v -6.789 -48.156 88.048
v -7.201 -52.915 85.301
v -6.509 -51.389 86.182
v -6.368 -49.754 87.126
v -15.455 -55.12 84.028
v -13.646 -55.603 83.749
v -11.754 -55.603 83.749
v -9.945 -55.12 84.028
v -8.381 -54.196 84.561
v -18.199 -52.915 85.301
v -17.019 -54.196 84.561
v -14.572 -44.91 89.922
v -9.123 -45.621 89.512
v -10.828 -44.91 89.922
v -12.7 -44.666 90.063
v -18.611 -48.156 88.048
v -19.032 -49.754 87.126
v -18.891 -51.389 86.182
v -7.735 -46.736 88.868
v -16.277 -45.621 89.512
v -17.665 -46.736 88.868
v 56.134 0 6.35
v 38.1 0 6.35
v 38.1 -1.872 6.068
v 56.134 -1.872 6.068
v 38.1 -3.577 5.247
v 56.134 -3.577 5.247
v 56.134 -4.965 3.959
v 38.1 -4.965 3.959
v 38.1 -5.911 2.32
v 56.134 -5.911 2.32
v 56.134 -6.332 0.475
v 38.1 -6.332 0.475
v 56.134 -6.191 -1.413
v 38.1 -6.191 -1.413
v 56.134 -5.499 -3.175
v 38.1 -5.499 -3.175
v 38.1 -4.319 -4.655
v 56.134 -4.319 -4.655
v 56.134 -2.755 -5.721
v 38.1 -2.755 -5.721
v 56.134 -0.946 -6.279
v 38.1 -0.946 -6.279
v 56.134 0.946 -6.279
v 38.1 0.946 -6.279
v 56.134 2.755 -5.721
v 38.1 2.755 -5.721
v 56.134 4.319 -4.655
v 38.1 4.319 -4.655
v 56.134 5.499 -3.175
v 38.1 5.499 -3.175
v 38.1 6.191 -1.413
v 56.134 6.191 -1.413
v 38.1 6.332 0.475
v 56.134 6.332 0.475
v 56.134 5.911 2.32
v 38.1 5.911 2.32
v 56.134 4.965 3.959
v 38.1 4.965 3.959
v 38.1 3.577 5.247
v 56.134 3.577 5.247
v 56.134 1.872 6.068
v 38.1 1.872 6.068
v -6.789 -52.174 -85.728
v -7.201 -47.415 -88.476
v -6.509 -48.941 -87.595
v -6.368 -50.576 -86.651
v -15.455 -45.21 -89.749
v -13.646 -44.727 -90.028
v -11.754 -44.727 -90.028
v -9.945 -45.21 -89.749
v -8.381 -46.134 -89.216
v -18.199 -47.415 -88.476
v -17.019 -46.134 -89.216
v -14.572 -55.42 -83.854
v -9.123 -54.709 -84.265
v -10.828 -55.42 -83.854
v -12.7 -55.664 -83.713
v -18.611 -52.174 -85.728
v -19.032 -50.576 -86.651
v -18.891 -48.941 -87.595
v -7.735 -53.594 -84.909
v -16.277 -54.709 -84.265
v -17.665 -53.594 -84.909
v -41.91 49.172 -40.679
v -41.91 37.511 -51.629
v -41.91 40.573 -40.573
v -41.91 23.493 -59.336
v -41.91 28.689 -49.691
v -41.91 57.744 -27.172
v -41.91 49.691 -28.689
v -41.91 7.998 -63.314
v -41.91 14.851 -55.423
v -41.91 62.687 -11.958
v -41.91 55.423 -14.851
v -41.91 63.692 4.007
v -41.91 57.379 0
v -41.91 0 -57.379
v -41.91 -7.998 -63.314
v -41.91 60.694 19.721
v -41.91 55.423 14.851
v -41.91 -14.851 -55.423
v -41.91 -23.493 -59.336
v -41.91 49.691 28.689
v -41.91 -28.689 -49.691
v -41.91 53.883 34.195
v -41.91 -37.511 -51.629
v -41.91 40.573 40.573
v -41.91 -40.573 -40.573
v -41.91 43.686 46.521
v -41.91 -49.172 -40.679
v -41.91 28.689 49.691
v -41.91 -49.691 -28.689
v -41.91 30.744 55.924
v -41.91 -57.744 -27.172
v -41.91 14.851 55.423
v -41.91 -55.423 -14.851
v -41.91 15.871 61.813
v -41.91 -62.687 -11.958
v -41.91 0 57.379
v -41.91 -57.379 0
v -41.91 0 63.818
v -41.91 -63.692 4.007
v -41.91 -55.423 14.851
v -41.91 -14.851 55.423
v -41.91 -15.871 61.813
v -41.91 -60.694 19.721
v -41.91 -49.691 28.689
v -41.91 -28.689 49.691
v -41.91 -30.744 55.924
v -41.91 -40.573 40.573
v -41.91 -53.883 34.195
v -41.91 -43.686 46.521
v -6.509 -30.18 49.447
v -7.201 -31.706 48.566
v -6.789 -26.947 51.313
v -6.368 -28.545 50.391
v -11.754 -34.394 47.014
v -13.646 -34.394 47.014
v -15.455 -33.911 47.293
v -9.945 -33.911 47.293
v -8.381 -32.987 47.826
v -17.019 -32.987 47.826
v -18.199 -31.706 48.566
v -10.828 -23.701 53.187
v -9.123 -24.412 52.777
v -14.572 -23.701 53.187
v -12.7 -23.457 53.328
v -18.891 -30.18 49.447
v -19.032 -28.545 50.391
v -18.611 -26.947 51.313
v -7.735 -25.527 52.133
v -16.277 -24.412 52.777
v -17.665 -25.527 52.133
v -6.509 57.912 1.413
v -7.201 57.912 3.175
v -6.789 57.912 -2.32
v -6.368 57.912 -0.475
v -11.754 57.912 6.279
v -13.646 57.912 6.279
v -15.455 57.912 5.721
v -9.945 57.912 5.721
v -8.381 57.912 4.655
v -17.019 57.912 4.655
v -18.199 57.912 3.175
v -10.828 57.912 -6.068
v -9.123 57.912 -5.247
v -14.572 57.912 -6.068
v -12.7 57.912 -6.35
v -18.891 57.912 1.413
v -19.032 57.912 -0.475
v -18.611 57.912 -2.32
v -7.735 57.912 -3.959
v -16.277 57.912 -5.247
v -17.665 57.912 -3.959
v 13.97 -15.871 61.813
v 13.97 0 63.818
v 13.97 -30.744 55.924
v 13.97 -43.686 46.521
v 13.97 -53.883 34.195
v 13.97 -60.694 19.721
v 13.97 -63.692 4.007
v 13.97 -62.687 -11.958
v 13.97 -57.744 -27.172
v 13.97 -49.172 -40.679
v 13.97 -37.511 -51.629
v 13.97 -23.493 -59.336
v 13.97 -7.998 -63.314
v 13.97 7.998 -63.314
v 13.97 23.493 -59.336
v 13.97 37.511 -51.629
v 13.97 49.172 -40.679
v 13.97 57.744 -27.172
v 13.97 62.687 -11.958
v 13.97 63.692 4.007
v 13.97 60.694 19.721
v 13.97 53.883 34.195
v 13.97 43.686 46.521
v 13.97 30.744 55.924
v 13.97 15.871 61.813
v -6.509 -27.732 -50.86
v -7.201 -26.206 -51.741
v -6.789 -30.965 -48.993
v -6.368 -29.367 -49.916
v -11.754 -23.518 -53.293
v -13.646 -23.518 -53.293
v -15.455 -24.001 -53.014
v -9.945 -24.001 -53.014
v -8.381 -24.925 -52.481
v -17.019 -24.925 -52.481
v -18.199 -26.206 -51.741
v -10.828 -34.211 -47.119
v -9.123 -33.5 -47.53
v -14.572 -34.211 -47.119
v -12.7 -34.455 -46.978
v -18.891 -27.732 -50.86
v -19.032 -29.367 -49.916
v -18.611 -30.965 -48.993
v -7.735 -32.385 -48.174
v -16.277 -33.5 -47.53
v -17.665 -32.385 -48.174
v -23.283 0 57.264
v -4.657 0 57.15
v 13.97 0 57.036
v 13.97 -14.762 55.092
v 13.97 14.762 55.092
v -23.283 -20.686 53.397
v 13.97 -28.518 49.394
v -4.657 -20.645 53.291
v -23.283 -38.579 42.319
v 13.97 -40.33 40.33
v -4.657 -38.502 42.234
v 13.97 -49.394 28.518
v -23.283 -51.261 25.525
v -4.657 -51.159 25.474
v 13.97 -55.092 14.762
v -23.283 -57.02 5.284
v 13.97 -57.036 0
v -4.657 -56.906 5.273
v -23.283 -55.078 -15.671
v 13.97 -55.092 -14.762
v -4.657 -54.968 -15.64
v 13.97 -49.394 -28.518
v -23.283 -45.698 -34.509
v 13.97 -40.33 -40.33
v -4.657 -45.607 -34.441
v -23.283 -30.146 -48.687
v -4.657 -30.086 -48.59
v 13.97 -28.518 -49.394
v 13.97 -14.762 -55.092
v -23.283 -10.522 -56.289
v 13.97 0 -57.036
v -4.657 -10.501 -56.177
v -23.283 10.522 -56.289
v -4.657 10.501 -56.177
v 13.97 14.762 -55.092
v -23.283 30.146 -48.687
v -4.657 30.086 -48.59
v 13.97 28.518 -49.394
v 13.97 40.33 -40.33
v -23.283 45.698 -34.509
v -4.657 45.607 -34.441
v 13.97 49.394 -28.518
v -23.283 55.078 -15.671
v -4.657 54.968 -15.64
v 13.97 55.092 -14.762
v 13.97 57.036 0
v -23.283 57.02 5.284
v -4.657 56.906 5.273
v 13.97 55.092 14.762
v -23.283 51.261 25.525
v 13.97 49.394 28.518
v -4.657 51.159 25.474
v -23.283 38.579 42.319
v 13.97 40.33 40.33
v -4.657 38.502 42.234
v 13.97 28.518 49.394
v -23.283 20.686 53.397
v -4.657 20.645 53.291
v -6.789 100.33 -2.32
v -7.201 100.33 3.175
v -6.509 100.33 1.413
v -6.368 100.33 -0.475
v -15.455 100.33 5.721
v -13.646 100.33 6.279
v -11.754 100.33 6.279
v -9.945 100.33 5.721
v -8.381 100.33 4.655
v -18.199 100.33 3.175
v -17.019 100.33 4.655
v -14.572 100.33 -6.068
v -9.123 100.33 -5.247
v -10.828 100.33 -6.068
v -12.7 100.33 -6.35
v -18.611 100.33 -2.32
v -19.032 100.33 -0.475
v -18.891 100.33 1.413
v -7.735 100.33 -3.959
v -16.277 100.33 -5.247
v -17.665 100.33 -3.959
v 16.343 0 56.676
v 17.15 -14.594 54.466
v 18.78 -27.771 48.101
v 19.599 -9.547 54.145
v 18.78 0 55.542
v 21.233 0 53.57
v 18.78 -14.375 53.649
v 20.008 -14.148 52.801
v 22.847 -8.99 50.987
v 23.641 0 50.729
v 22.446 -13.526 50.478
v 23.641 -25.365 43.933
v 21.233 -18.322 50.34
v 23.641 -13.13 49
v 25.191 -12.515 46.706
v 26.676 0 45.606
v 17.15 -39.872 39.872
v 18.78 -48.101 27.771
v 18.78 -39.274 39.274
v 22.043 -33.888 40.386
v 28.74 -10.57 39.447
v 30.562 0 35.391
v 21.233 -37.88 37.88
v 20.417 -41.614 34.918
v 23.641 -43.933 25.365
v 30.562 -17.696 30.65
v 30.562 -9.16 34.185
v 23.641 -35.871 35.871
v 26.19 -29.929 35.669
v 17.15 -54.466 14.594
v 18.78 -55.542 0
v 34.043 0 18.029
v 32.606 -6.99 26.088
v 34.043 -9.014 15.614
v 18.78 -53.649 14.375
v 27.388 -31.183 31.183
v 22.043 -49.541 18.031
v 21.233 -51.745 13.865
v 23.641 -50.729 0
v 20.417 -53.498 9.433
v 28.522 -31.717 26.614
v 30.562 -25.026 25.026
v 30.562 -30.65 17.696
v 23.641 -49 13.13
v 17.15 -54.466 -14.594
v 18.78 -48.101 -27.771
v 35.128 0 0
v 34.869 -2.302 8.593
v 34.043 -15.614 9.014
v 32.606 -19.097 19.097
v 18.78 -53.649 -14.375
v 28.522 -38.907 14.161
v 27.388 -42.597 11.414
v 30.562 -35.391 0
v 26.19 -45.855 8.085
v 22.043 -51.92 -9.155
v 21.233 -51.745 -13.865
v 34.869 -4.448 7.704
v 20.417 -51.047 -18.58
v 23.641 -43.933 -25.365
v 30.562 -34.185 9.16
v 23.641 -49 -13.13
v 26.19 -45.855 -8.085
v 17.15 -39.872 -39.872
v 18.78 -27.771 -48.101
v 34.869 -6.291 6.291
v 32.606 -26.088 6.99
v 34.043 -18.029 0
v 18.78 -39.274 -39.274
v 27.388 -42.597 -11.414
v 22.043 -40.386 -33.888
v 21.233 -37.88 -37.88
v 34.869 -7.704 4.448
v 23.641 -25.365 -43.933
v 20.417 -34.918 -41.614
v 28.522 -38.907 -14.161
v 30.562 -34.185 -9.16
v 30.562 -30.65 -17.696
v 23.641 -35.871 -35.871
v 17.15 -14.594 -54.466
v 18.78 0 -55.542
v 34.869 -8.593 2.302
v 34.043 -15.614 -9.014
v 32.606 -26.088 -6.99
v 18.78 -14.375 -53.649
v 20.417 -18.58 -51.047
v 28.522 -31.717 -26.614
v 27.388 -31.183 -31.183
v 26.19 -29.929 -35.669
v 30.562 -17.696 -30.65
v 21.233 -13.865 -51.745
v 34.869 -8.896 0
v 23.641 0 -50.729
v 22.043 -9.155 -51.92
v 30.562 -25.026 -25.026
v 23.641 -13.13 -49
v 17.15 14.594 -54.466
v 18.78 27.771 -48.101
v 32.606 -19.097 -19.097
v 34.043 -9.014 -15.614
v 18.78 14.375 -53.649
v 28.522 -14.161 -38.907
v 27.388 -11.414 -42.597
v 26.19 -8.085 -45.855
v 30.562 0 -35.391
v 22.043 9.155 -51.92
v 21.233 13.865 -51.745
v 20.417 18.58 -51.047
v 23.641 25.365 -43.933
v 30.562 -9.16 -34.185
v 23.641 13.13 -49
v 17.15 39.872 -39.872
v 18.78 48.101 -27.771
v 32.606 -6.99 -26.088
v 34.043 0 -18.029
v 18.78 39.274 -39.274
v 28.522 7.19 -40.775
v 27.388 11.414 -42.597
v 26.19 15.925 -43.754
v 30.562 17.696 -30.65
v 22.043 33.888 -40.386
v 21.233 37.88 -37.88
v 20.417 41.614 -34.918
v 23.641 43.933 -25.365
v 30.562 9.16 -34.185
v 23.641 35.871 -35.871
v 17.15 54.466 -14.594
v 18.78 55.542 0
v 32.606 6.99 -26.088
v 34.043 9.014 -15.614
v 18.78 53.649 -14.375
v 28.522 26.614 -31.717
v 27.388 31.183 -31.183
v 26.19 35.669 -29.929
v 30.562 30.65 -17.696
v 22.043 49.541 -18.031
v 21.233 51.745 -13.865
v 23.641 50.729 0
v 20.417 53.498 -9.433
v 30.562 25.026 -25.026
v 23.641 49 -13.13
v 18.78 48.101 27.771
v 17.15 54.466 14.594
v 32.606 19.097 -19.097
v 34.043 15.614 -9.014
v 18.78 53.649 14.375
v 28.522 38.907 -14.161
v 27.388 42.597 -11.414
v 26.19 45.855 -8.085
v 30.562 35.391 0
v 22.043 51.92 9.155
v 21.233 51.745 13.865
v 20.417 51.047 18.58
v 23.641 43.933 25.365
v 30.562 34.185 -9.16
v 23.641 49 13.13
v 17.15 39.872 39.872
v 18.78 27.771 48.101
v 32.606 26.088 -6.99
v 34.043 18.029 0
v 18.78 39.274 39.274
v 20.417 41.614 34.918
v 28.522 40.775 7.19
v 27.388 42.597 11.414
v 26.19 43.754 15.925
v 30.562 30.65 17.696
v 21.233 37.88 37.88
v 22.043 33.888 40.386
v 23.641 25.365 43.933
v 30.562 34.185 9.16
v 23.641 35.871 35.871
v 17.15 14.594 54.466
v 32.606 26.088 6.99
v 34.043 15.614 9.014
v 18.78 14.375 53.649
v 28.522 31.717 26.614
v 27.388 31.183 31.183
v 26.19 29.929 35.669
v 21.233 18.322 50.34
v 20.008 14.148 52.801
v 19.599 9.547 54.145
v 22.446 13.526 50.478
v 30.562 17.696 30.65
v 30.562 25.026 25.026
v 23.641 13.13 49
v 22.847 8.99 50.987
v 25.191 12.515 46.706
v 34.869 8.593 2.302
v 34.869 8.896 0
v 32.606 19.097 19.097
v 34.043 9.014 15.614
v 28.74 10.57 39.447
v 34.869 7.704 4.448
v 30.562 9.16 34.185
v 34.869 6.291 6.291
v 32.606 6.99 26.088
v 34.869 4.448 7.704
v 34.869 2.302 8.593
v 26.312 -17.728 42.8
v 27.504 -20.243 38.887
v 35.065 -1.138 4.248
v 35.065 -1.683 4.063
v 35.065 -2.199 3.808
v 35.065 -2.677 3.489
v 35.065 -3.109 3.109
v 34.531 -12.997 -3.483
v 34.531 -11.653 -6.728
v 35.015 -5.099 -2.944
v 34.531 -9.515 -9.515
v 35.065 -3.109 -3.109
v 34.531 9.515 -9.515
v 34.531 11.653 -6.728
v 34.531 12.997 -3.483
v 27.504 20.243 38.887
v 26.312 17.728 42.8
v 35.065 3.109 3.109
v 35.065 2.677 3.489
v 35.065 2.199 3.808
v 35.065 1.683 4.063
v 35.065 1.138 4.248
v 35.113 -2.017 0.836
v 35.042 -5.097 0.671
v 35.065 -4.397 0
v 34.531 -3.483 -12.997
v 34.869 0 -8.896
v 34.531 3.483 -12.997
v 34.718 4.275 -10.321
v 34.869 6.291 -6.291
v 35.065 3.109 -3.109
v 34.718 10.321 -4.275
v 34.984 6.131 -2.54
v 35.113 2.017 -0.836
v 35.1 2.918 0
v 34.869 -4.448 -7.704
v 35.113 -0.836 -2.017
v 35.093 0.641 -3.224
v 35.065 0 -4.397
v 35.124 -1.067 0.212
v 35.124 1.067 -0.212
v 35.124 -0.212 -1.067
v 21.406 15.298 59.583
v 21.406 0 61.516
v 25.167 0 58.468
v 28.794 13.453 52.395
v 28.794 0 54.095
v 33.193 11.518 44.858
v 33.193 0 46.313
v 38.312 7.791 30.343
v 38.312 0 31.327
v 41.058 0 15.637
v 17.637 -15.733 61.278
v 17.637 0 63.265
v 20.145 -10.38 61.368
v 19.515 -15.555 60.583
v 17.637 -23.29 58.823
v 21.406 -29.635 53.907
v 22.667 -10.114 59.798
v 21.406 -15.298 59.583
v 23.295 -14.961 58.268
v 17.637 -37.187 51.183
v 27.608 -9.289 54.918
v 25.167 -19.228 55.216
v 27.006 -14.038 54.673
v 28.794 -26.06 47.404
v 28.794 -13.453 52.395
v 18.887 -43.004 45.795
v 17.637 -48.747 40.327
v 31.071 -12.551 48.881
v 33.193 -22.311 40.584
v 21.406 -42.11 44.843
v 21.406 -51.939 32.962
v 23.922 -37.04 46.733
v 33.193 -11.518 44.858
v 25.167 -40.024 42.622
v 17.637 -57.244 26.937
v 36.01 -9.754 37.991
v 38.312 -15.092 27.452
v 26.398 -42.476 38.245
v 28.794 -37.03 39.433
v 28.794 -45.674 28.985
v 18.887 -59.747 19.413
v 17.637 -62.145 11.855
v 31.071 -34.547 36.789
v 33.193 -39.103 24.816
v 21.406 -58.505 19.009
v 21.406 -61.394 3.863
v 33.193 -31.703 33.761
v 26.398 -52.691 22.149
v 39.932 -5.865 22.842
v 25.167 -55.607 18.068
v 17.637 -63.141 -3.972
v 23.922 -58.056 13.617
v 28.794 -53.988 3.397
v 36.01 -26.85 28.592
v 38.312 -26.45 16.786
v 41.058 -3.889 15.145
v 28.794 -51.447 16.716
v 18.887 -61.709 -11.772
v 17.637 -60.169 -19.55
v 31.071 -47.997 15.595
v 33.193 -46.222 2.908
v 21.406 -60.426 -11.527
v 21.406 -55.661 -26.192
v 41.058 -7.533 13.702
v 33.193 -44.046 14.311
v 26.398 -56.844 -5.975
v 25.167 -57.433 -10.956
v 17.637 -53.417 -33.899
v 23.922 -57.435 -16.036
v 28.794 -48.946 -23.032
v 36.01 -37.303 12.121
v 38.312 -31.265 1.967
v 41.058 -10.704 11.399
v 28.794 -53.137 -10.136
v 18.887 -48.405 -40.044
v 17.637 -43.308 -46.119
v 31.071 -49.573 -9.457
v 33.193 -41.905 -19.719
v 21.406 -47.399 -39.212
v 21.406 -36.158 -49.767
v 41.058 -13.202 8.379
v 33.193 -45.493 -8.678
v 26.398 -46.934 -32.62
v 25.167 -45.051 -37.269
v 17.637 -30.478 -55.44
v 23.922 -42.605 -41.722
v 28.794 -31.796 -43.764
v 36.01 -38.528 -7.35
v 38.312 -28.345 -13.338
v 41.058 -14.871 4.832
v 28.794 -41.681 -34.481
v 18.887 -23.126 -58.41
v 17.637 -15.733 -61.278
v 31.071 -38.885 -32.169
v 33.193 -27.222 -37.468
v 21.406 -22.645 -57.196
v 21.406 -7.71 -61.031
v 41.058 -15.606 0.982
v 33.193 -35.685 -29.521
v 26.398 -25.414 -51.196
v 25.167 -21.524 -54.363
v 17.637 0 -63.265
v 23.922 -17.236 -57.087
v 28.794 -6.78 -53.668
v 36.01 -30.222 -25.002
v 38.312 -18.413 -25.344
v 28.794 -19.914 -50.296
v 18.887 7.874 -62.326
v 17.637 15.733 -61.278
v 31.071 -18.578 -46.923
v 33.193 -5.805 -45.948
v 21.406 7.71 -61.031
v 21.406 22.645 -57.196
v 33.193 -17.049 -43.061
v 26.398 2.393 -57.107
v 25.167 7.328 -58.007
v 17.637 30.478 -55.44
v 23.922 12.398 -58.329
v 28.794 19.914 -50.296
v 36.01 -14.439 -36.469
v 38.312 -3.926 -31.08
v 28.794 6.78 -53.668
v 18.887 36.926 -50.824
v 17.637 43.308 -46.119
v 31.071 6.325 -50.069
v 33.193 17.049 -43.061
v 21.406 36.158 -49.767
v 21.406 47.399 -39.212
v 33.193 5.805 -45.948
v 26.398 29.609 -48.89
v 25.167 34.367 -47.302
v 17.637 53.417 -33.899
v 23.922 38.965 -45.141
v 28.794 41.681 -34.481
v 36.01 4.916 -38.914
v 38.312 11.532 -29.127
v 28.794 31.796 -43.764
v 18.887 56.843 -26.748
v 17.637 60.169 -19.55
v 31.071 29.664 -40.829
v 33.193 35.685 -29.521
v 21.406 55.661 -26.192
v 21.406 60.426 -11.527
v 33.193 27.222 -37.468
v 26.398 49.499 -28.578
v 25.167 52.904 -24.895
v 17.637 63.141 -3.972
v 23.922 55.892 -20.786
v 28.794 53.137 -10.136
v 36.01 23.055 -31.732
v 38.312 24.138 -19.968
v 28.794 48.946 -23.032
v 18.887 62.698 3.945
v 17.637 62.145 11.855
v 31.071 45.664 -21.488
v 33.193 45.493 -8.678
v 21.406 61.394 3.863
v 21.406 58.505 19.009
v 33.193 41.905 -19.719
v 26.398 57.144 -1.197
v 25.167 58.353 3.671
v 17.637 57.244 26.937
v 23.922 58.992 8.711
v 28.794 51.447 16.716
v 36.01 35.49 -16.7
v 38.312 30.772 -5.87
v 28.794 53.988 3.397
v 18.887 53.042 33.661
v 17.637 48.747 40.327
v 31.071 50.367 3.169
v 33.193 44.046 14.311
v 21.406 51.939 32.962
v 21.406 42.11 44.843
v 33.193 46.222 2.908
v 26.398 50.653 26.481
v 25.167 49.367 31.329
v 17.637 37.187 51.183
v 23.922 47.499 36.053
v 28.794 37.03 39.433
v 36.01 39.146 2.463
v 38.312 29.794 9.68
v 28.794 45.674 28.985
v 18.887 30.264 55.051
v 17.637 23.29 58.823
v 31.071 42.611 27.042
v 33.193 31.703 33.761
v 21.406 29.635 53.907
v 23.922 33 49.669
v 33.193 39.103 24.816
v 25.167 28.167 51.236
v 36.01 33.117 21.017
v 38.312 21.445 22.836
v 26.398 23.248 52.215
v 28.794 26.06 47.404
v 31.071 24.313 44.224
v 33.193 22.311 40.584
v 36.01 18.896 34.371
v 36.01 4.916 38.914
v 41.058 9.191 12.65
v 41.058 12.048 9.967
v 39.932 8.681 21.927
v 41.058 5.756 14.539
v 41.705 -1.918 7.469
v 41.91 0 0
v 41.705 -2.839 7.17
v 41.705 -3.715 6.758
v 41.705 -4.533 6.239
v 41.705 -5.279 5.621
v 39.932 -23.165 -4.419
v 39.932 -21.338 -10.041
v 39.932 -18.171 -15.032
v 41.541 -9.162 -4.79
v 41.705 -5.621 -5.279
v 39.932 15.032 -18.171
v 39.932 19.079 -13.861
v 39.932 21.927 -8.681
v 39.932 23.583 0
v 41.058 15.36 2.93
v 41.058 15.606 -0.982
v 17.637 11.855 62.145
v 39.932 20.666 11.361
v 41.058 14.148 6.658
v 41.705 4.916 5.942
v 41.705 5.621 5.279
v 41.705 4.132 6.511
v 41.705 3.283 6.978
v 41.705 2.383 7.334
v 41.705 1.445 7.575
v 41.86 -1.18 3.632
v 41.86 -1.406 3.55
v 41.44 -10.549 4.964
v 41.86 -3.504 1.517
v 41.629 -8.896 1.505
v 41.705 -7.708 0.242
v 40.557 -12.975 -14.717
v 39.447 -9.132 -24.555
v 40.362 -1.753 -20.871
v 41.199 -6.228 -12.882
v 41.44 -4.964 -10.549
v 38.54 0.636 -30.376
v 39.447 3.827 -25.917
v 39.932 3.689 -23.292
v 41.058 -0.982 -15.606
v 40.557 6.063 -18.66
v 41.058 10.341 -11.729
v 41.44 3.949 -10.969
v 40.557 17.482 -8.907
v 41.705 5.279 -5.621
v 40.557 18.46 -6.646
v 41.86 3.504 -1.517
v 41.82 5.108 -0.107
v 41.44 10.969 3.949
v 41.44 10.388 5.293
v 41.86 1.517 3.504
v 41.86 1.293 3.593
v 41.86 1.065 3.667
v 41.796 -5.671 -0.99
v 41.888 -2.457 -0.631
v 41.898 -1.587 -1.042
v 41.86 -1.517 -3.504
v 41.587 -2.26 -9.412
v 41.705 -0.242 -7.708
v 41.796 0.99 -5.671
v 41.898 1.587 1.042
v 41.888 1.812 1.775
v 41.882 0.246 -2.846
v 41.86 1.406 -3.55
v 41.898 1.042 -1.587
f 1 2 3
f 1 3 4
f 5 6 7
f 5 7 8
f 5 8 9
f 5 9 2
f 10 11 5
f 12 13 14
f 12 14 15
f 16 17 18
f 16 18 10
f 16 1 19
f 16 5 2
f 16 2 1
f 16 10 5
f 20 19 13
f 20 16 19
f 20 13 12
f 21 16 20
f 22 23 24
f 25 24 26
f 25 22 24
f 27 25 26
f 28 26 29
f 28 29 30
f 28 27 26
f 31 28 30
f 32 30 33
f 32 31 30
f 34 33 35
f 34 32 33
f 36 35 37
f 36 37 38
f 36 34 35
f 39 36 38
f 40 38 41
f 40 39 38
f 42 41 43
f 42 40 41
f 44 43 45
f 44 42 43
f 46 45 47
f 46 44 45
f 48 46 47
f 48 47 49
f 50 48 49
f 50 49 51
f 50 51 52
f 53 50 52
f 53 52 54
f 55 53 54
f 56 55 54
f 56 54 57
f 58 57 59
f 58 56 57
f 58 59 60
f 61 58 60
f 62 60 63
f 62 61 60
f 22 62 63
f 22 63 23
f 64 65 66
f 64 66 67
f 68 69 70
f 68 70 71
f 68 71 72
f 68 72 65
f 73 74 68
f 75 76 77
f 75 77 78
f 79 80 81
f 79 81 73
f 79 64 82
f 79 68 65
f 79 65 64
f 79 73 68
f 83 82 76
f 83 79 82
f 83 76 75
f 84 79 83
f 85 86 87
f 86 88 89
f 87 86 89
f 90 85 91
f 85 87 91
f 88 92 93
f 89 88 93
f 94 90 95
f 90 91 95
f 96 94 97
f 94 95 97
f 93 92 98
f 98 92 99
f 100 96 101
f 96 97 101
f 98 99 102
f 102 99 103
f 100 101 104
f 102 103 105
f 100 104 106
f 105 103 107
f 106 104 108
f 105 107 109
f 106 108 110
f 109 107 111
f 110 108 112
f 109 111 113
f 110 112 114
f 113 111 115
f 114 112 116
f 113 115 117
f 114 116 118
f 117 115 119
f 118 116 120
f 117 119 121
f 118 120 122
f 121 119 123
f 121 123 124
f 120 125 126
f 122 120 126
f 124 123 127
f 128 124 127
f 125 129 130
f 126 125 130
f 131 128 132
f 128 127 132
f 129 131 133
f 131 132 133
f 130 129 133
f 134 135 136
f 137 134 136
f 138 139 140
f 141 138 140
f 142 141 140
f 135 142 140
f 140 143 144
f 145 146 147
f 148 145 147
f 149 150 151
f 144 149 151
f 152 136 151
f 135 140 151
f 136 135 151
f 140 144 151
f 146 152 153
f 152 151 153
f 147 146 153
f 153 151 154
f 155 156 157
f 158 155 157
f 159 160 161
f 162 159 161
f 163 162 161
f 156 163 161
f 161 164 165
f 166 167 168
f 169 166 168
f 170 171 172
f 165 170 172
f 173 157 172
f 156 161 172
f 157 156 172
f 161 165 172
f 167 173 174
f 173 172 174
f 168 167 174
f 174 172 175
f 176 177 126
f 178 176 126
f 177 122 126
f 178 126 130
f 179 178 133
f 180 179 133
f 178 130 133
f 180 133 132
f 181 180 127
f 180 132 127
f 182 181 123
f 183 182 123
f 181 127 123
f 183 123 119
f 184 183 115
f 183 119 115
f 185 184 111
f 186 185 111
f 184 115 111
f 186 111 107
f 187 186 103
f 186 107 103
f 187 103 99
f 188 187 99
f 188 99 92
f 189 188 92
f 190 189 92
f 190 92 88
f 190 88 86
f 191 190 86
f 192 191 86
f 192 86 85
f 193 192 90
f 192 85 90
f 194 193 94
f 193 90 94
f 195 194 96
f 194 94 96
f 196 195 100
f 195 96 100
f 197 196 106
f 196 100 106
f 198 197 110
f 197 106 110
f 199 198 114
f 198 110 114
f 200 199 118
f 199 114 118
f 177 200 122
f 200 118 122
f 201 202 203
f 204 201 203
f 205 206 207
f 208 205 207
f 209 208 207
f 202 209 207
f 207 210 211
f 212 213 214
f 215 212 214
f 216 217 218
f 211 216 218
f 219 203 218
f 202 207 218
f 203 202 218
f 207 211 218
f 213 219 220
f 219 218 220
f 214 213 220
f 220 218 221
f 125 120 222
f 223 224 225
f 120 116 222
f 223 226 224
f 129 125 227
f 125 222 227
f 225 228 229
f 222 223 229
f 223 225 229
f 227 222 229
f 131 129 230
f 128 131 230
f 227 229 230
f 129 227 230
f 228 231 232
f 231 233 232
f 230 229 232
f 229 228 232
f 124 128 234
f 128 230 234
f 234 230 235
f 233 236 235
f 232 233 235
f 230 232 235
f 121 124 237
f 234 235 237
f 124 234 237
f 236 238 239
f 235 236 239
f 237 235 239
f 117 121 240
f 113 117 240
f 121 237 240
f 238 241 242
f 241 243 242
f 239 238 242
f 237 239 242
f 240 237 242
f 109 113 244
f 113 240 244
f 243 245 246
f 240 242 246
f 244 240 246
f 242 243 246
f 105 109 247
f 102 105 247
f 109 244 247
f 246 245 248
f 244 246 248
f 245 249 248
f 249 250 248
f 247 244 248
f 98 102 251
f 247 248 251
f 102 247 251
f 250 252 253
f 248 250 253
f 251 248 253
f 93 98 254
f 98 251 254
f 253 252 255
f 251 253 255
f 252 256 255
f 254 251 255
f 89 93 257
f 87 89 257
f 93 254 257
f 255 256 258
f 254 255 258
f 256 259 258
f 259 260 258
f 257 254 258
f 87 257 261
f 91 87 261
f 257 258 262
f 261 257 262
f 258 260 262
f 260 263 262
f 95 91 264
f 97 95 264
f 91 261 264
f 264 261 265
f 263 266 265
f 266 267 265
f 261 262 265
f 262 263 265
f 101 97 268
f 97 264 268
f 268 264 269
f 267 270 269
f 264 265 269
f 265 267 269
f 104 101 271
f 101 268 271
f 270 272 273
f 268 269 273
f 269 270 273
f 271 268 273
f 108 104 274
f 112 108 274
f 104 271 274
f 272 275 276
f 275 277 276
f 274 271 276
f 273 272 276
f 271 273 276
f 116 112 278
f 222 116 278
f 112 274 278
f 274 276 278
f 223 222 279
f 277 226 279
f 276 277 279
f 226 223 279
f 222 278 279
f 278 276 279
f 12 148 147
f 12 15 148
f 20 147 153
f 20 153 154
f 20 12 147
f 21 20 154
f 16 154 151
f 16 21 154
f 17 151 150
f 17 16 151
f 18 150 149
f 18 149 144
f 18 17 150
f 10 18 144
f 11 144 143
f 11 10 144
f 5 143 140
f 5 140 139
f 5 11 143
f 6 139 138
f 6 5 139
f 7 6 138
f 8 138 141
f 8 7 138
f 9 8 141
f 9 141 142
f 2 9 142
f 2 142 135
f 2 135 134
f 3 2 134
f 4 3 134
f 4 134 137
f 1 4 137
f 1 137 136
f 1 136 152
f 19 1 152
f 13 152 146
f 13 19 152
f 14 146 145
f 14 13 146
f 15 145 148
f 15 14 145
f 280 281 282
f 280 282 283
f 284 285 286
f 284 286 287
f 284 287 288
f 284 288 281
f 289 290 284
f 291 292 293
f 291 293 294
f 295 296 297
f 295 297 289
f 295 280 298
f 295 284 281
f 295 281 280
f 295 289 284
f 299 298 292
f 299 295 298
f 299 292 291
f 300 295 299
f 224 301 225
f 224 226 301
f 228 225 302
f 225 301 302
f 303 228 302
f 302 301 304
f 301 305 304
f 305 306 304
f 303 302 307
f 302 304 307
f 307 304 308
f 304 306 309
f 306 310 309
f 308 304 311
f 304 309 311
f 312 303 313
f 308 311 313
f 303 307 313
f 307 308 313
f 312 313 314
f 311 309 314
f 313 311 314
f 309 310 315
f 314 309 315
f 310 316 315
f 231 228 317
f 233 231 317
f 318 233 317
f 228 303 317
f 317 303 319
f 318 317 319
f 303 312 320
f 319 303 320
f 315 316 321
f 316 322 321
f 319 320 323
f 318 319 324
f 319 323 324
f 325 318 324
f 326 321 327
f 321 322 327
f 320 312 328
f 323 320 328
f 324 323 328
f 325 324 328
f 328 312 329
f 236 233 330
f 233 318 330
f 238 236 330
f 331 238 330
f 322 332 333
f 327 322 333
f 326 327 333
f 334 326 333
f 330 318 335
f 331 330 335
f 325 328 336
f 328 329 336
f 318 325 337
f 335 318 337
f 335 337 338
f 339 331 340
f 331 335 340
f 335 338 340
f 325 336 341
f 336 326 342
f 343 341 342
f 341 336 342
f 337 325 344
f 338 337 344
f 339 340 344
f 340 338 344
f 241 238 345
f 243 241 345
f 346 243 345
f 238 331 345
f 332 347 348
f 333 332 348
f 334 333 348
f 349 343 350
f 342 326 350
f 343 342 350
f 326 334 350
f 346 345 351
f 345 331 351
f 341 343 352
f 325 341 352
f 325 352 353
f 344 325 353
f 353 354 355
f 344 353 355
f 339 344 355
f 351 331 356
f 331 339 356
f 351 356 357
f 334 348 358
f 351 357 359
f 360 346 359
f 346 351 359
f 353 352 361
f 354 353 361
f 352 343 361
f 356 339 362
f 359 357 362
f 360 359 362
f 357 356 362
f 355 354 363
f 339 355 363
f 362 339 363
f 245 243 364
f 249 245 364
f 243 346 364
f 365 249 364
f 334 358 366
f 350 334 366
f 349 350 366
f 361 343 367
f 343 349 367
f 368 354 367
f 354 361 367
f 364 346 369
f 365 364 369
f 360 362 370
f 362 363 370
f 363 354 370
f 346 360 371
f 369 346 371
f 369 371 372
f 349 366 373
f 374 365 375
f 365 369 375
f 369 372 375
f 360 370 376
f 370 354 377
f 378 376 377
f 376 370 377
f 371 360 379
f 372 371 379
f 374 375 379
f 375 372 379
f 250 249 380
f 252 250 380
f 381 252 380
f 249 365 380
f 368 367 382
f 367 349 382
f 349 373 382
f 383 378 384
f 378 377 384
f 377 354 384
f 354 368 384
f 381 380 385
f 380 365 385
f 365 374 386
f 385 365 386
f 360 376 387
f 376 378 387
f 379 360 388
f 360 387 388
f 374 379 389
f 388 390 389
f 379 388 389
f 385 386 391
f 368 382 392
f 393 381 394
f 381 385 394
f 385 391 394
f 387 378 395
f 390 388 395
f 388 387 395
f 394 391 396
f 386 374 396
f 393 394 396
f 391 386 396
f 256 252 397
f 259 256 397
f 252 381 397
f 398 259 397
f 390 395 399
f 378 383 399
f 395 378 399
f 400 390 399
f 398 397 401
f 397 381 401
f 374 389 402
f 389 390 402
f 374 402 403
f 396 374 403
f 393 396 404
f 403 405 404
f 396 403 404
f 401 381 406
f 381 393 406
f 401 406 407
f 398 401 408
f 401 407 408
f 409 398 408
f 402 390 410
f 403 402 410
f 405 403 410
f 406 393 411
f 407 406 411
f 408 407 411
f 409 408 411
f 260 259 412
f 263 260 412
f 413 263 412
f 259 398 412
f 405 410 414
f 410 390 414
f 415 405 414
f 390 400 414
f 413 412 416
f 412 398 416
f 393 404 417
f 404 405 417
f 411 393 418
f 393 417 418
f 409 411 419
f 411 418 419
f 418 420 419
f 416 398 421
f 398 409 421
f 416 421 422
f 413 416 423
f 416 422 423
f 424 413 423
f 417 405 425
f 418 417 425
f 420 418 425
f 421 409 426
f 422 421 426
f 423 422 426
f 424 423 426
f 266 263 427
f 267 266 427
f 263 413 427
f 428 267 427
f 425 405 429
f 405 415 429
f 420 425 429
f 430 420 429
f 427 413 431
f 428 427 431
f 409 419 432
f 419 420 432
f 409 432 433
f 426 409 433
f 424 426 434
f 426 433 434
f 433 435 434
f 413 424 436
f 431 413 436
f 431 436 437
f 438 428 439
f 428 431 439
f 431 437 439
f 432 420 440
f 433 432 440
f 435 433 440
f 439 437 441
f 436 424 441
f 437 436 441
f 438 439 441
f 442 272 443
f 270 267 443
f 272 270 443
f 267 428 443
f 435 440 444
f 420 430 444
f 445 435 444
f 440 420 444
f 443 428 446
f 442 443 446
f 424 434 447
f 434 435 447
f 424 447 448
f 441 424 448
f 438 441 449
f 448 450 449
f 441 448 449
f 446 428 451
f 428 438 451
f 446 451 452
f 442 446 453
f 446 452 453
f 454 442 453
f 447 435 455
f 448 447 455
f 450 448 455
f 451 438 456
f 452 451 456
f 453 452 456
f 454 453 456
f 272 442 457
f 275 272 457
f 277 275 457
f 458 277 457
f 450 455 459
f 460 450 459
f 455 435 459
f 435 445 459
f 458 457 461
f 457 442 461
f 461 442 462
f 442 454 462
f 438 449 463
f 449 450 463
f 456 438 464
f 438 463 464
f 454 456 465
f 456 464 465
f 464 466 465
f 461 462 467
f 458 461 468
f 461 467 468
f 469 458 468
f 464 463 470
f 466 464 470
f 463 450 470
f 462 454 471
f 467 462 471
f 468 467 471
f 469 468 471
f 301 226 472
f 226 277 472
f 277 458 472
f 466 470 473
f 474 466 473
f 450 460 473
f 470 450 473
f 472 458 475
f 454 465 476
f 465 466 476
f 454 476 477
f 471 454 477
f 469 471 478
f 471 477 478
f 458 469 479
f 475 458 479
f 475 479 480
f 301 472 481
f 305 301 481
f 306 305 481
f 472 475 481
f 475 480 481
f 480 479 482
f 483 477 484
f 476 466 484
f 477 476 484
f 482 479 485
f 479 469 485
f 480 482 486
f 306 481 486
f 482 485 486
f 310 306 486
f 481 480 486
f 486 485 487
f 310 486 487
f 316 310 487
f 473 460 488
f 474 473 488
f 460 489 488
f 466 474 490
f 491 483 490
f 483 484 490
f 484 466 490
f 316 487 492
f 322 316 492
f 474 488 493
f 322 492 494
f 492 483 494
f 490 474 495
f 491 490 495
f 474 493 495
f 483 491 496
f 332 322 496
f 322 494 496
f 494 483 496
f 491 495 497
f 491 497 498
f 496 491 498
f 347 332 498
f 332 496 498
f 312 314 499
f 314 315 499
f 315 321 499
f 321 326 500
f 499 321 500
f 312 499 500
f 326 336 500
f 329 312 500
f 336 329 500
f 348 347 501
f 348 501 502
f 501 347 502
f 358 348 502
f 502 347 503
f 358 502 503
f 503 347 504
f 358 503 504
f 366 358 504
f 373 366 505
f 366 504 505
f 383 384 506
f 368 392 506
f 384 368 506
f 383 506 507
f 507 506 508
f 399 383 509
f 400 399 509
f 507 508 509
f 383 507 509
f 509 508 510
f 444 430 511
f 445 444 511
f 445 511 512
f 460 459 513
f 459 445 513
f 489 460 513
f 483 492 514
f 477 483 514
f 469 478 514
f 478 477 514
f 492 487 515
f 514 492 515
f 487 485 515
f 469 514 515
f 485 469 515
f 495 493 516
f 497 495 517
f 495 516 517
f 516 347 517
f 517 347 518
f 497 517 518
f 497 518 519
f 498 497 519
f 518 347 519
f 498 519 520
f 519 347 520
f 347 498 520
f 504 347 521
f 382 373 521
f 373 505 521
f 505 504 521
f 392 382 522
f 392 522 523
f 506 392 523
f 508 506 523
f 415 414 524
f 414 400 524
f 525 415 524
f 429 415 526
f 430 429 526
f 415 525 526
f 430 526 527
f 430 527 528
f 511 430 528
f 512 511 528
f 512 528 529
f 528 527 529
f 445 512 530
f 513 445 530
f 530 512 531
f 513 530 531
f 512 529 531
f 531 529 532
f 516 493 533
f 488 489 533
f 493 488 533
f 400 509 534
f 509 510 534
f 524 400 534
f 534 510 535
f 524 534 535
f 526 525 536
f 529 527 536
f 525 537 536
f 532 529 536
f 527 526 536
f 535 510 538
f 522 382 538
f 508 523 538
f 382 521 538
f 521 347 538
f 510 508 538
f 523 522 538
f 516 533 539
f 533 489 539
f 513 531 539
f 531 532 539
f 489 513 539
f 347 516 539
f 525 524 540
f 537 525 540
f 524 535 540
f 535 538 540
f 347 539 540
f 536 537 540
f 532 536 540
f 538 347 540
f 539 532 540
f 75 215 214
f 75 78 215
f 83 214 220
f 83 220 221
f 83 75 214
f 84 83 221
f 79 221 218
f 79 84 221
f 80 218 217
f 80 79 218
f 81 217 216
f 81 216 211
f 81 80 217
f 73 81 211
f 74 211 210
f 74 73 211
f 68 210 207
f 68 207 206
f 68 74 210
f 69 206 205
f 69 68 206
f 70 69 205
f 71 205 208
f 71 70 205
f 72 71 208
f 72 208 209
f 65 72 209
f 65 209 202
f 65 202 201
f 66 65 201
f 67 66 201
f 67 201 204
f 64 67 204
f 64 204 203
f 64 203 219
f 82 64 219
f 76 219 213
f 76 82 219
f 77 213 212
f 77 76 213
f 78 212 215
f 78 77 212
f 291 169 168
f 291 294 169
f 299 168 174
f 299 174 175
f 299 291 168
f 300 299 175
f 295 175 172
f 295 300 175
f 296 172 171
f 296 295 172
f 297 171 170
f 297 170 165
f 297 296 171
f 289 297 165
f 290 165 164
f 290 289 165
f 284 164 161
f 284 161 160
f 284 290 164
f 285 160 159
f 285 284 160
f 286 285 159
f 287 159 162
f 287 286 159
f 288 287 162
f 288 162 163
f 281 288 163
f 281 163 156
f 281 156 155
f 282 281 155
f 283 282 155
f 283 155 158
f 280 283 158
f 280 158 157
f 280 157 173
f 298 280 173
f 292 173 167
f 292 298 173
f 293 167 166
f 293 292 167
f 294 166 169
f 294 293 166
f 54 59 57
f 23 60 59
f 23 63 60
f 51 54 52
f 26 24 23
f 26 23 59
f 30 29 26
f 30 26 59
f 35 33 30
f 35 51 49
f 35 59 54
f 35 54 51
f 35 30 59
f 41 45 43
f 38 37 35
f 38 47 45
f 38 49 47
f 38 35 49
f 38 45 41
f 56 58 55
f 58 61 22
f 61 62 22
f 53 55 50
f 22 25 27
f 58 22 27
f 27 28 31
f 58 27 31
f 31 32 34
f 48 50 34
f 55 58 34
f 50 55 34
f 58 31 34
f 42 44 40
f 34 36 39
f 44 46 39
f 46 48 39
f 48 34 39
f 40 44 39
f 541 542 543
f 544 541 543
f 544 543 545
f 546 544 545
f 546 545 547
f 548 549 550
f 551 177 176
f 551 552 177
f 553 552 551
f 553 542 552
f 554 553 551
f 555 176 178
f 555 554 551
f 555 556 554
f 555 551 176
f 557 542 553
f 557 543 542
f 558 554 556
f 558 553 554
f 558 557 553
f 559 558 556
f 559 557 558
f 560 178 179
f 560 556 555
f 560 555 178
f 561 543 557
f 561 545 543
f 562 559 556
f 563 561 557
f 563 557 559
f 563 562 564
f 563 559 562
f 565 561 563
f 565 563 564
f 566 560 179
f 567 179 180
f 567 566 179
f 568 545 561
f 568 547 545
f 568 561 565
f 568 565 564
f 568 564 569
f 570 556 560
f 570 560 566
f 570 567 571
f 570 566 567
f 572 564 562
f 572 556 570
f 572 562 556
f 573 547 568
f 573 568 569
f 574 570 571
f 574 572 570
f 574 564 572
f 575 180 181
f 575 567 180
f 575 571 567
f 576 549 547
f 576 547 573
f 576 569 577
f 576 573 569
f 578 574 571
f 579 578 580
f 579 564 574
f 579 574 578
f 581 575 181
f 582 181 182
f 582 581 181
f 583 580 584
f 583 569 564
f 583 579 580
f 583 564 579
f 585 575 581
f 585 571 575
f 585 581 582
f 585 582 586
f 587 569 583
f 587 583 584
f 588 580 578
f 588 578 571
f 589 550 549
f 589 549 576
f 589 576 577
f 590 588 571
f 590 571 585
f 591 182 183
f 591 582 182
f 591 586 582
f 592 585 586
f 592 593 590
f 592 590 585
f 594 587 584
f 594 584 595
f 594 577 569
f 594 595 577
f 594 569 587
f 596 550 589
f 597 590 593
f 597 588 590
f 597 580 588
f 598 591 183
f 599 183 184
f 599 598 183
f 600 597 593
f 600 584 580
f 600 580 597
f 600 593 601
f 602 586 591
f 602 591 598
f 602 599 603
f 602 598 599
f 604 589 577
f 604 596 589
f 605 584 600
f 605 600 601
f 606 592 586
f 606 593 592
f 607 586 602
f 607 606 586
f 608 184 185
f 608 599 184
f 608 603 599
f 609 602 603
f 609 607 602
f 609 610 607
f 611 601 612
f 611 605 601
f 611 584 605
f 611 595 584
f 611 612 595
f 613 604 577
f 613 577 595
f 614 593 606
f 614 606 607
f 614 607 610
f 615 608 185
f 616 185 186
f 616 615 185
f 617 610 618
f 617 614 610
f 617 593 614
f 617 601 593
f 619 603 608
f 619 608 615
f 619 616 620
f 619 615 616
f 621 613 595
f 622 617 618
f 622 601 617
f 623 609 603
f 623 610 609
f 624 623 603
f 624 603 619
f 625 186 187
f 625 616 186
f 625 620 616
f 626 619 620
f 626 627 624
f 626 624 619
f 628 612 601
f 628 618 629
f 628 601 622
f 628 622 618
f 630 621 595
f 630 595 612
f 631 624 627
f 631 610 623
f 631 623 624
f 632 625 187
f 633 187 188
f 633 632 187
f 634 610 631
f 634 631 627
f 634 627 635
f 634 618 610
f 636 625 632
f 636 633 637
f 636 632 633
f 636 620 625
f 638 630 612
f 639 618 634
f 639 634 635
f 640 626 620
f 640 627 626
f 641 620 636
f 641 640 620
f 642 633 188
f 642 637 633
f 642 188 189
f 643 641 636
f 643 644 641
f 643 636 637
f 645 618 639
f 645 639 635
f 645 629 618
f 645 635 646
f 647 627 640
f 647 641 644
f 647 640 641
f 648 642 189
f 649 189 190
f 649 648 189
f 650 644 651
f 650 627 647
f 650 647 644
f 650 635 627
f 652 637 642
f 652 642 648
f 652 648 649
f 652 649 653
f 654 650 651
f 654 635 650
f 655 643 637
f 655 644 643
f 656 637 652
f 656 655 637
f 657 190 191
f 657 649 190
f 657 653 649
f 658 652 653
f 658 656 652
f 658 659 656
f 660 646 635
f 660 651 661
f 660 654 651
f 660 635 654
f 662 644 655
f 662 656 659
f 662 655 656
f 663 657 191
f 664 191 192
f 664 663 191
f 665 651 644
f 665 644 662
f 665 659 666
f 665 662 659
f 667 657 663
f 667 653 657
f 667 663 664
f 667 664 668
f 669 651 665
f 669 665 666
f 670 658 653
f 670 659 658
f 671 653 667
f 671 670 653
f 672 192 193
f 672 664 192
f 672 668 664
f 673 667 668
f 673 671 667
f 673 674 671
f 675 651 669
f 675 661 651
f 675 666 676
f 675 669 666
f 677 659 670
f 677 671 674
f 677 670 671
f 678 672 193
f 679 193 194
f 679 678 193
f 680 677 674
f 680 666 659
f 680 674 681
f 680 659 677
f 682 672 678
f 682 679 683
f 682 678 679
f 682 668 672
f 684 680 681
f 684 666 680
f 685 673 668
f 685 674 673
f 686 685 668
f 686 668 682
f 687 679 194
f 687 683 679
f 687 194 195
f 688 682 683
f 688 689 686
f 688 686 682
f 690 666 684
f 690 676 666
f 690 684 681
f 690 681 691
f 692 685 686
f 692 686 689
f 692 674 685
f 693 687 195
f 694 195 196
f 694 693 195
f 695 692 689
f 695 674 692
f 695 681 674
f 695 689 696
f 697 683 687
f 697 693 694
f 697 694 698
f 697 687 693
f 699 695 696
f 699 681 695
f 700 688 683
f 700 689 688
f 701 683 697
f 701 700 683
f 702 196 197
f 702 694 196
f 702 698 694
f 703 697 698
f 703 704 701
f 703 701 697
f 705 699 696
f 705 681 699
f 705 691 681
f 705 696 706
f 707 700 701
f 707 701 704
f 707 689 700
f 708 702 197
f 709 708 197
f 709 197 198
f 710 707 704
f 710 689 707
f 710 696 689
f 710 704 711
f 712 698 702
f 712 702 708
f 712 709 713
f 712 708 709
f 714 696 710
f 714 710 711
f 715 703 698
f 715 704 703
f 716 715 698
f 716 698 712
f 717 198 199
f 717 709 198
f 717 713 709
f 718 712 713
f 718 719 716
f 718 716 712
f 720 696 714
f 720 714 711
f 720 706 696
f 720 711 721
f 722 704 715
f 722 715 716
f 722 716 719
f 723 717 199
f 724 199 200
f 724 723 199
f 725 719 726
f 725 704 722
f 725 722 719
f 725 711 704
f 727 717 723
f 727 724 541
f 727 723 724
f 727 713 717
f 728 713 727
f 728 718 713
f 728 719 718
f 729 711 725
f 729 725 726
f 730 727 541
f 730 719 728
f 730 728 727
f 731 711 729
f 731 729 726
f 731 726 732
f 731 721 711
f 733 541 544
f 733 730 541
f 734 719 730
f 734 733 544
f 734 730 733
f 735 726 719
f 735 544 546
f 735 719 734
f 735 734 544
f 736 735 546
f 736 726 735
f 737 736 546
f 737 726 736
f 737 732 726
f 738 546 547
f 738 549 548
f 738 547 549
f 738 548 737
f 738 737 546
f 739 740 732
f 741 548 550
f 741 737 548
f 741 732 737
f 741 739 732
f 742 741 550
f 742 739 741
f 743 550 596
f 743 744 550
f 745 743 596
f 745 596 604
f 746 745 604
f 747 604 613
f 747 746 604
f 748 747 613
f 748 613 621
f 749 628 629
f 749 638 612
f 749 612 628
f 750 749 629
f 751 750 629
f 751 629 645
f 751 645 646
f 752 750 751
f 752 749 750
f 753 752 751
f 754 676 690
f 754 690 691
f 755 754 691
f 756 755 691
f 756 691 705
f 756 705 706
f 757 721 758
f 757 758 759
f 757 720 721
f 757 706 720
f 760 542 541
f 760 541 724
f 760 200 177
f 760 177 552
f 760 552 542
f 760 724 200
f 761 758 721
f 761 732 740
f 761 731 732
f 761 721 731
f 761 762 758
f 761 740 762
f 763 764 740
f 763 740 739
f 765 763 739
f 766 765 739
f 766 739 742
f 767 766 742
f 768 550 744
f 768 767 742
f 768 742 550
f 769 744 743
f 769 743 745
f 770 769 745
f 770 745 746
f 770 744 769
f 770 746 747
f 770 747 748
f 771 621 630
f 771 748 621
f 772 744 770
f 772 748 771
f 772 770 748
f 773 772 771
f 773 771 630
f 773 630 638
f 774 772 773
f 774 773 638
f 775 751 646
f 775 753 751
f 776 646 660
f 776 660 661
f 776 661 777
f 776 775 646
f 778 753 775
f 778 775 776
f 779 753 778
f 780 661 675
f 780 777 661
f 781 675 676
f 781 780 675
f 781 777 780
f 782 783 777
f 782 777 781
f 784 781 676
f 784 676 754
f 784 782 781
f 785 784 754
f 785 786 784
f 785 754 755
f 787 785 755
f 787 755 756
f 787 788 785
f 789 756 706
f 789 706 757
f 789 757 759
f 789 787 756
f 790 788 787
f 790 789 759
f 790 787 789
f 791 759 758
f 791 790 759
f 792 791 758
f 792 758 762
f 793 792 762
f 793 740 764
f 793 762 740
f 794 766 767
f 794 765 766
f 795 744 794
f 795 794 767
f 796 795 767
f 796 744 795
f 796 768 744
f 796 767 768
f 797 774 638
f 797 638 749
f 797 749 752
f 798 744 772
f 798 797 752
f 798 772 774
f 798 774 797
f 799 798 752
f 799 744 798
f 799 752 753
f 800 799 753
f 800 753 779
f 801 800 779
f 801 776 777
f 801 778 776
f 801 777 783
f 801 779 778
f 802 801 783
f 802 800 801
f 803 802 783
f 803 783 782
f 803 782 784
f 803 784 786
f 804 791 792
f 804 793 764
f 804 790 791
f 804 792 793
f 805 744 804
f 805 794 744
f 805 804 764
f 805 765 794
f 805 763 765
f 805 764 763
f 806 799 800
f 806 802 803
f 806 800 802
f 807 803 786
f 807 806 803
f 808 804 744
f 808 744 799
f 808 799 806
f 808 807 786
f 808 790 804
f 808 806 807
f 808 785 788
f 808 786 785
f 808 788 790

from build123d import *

# Parameters (mm, degrees)
SKETCH2_W         = 6.35
SKETCH2_H         = 42.418
CIRPATTERN1_COUNT = 3
SKETCH3_W         = 18.034
SKETCH3_H         = 6.35


with BuildPart() as part:
    # Sketch1 → Revolve1 (revolve)
    with BuildSketch(Plane.XY):
        with BuildLine():
            Line((35.1282, 0), (41.91, 0))
            add(Edge.make_bspline(
                [(13.97, -63.8175), (41.91, -63.8175), (41.91, 0)],
                knots=[3.141592654, 3.141592654, 3.141592654, 4.71238898, 4.71238898, 4.71238898], degree=2, weights=[1, 0.707106781, 1]))
            Line((13.97, -63.8175), (-41.91, -63.8175))
            Line((-41.91, -63.8175), (-41.91, -57.3786))
            Line((-41.91, -57.3786), (13.97, -57.0357))
            add(Edge.make_bspline(
                [(13.97, -57.0357), (35.1282, -57.0357), (35.1282, 0)],
                knots=[0, 0, 0, 1.570796327, 1.570796327, 1.570796327], degree=2, weights=[1, 0.707106781, 1]))
        make_face()
    revolve(axis=Axis((-41.91, 0, 0), (1, 0, 0)))


with BuildPart() as body_2:
    # Sketch2 → Revolve2 (revolve)
    with BuildSketch(Plane.XY):
        with Locations((-15.875, 79.121)):
            Rectangle(SKETCH2_W, SKETCH2_H)
    revolve(axis=Axis((-12.7, -906.949839724, 0), (0, 1, 0)))


with BuildPart() as cirpattern1_1:
    # CirPattern1: pattern copy
    add(body_2.part.rotate(Axis((-46.101, 0, 0), (1, 0, 0)), 1 * 360 / CIRPATTERN1_COUNT))


with BuildPart() as cirpattern1_2:
    # CirPattern1: pattern copy
    add(body_2.part.rotate(Axis((-46.101, 0, 0), (1, 0, 0)), 2 * 360 / CIRPATTERN1_COUNT))


with BuildPart() as body_5:
    # Sketch3 → Revolve3 (revolve)
    with BuildSketch(Plane.XY):
        with Locations((47.117, 3.175)):
            Rectangle(SKETCH3_W, SKETCH3_H)
    revolve(axis=Axis((-1078.063901148, 0, 0), (1, 0, 0)))


solid = Compound([part.part, body_2.part, cirpattern1_1.part, cirpattern1_2.part, body_5.part])
